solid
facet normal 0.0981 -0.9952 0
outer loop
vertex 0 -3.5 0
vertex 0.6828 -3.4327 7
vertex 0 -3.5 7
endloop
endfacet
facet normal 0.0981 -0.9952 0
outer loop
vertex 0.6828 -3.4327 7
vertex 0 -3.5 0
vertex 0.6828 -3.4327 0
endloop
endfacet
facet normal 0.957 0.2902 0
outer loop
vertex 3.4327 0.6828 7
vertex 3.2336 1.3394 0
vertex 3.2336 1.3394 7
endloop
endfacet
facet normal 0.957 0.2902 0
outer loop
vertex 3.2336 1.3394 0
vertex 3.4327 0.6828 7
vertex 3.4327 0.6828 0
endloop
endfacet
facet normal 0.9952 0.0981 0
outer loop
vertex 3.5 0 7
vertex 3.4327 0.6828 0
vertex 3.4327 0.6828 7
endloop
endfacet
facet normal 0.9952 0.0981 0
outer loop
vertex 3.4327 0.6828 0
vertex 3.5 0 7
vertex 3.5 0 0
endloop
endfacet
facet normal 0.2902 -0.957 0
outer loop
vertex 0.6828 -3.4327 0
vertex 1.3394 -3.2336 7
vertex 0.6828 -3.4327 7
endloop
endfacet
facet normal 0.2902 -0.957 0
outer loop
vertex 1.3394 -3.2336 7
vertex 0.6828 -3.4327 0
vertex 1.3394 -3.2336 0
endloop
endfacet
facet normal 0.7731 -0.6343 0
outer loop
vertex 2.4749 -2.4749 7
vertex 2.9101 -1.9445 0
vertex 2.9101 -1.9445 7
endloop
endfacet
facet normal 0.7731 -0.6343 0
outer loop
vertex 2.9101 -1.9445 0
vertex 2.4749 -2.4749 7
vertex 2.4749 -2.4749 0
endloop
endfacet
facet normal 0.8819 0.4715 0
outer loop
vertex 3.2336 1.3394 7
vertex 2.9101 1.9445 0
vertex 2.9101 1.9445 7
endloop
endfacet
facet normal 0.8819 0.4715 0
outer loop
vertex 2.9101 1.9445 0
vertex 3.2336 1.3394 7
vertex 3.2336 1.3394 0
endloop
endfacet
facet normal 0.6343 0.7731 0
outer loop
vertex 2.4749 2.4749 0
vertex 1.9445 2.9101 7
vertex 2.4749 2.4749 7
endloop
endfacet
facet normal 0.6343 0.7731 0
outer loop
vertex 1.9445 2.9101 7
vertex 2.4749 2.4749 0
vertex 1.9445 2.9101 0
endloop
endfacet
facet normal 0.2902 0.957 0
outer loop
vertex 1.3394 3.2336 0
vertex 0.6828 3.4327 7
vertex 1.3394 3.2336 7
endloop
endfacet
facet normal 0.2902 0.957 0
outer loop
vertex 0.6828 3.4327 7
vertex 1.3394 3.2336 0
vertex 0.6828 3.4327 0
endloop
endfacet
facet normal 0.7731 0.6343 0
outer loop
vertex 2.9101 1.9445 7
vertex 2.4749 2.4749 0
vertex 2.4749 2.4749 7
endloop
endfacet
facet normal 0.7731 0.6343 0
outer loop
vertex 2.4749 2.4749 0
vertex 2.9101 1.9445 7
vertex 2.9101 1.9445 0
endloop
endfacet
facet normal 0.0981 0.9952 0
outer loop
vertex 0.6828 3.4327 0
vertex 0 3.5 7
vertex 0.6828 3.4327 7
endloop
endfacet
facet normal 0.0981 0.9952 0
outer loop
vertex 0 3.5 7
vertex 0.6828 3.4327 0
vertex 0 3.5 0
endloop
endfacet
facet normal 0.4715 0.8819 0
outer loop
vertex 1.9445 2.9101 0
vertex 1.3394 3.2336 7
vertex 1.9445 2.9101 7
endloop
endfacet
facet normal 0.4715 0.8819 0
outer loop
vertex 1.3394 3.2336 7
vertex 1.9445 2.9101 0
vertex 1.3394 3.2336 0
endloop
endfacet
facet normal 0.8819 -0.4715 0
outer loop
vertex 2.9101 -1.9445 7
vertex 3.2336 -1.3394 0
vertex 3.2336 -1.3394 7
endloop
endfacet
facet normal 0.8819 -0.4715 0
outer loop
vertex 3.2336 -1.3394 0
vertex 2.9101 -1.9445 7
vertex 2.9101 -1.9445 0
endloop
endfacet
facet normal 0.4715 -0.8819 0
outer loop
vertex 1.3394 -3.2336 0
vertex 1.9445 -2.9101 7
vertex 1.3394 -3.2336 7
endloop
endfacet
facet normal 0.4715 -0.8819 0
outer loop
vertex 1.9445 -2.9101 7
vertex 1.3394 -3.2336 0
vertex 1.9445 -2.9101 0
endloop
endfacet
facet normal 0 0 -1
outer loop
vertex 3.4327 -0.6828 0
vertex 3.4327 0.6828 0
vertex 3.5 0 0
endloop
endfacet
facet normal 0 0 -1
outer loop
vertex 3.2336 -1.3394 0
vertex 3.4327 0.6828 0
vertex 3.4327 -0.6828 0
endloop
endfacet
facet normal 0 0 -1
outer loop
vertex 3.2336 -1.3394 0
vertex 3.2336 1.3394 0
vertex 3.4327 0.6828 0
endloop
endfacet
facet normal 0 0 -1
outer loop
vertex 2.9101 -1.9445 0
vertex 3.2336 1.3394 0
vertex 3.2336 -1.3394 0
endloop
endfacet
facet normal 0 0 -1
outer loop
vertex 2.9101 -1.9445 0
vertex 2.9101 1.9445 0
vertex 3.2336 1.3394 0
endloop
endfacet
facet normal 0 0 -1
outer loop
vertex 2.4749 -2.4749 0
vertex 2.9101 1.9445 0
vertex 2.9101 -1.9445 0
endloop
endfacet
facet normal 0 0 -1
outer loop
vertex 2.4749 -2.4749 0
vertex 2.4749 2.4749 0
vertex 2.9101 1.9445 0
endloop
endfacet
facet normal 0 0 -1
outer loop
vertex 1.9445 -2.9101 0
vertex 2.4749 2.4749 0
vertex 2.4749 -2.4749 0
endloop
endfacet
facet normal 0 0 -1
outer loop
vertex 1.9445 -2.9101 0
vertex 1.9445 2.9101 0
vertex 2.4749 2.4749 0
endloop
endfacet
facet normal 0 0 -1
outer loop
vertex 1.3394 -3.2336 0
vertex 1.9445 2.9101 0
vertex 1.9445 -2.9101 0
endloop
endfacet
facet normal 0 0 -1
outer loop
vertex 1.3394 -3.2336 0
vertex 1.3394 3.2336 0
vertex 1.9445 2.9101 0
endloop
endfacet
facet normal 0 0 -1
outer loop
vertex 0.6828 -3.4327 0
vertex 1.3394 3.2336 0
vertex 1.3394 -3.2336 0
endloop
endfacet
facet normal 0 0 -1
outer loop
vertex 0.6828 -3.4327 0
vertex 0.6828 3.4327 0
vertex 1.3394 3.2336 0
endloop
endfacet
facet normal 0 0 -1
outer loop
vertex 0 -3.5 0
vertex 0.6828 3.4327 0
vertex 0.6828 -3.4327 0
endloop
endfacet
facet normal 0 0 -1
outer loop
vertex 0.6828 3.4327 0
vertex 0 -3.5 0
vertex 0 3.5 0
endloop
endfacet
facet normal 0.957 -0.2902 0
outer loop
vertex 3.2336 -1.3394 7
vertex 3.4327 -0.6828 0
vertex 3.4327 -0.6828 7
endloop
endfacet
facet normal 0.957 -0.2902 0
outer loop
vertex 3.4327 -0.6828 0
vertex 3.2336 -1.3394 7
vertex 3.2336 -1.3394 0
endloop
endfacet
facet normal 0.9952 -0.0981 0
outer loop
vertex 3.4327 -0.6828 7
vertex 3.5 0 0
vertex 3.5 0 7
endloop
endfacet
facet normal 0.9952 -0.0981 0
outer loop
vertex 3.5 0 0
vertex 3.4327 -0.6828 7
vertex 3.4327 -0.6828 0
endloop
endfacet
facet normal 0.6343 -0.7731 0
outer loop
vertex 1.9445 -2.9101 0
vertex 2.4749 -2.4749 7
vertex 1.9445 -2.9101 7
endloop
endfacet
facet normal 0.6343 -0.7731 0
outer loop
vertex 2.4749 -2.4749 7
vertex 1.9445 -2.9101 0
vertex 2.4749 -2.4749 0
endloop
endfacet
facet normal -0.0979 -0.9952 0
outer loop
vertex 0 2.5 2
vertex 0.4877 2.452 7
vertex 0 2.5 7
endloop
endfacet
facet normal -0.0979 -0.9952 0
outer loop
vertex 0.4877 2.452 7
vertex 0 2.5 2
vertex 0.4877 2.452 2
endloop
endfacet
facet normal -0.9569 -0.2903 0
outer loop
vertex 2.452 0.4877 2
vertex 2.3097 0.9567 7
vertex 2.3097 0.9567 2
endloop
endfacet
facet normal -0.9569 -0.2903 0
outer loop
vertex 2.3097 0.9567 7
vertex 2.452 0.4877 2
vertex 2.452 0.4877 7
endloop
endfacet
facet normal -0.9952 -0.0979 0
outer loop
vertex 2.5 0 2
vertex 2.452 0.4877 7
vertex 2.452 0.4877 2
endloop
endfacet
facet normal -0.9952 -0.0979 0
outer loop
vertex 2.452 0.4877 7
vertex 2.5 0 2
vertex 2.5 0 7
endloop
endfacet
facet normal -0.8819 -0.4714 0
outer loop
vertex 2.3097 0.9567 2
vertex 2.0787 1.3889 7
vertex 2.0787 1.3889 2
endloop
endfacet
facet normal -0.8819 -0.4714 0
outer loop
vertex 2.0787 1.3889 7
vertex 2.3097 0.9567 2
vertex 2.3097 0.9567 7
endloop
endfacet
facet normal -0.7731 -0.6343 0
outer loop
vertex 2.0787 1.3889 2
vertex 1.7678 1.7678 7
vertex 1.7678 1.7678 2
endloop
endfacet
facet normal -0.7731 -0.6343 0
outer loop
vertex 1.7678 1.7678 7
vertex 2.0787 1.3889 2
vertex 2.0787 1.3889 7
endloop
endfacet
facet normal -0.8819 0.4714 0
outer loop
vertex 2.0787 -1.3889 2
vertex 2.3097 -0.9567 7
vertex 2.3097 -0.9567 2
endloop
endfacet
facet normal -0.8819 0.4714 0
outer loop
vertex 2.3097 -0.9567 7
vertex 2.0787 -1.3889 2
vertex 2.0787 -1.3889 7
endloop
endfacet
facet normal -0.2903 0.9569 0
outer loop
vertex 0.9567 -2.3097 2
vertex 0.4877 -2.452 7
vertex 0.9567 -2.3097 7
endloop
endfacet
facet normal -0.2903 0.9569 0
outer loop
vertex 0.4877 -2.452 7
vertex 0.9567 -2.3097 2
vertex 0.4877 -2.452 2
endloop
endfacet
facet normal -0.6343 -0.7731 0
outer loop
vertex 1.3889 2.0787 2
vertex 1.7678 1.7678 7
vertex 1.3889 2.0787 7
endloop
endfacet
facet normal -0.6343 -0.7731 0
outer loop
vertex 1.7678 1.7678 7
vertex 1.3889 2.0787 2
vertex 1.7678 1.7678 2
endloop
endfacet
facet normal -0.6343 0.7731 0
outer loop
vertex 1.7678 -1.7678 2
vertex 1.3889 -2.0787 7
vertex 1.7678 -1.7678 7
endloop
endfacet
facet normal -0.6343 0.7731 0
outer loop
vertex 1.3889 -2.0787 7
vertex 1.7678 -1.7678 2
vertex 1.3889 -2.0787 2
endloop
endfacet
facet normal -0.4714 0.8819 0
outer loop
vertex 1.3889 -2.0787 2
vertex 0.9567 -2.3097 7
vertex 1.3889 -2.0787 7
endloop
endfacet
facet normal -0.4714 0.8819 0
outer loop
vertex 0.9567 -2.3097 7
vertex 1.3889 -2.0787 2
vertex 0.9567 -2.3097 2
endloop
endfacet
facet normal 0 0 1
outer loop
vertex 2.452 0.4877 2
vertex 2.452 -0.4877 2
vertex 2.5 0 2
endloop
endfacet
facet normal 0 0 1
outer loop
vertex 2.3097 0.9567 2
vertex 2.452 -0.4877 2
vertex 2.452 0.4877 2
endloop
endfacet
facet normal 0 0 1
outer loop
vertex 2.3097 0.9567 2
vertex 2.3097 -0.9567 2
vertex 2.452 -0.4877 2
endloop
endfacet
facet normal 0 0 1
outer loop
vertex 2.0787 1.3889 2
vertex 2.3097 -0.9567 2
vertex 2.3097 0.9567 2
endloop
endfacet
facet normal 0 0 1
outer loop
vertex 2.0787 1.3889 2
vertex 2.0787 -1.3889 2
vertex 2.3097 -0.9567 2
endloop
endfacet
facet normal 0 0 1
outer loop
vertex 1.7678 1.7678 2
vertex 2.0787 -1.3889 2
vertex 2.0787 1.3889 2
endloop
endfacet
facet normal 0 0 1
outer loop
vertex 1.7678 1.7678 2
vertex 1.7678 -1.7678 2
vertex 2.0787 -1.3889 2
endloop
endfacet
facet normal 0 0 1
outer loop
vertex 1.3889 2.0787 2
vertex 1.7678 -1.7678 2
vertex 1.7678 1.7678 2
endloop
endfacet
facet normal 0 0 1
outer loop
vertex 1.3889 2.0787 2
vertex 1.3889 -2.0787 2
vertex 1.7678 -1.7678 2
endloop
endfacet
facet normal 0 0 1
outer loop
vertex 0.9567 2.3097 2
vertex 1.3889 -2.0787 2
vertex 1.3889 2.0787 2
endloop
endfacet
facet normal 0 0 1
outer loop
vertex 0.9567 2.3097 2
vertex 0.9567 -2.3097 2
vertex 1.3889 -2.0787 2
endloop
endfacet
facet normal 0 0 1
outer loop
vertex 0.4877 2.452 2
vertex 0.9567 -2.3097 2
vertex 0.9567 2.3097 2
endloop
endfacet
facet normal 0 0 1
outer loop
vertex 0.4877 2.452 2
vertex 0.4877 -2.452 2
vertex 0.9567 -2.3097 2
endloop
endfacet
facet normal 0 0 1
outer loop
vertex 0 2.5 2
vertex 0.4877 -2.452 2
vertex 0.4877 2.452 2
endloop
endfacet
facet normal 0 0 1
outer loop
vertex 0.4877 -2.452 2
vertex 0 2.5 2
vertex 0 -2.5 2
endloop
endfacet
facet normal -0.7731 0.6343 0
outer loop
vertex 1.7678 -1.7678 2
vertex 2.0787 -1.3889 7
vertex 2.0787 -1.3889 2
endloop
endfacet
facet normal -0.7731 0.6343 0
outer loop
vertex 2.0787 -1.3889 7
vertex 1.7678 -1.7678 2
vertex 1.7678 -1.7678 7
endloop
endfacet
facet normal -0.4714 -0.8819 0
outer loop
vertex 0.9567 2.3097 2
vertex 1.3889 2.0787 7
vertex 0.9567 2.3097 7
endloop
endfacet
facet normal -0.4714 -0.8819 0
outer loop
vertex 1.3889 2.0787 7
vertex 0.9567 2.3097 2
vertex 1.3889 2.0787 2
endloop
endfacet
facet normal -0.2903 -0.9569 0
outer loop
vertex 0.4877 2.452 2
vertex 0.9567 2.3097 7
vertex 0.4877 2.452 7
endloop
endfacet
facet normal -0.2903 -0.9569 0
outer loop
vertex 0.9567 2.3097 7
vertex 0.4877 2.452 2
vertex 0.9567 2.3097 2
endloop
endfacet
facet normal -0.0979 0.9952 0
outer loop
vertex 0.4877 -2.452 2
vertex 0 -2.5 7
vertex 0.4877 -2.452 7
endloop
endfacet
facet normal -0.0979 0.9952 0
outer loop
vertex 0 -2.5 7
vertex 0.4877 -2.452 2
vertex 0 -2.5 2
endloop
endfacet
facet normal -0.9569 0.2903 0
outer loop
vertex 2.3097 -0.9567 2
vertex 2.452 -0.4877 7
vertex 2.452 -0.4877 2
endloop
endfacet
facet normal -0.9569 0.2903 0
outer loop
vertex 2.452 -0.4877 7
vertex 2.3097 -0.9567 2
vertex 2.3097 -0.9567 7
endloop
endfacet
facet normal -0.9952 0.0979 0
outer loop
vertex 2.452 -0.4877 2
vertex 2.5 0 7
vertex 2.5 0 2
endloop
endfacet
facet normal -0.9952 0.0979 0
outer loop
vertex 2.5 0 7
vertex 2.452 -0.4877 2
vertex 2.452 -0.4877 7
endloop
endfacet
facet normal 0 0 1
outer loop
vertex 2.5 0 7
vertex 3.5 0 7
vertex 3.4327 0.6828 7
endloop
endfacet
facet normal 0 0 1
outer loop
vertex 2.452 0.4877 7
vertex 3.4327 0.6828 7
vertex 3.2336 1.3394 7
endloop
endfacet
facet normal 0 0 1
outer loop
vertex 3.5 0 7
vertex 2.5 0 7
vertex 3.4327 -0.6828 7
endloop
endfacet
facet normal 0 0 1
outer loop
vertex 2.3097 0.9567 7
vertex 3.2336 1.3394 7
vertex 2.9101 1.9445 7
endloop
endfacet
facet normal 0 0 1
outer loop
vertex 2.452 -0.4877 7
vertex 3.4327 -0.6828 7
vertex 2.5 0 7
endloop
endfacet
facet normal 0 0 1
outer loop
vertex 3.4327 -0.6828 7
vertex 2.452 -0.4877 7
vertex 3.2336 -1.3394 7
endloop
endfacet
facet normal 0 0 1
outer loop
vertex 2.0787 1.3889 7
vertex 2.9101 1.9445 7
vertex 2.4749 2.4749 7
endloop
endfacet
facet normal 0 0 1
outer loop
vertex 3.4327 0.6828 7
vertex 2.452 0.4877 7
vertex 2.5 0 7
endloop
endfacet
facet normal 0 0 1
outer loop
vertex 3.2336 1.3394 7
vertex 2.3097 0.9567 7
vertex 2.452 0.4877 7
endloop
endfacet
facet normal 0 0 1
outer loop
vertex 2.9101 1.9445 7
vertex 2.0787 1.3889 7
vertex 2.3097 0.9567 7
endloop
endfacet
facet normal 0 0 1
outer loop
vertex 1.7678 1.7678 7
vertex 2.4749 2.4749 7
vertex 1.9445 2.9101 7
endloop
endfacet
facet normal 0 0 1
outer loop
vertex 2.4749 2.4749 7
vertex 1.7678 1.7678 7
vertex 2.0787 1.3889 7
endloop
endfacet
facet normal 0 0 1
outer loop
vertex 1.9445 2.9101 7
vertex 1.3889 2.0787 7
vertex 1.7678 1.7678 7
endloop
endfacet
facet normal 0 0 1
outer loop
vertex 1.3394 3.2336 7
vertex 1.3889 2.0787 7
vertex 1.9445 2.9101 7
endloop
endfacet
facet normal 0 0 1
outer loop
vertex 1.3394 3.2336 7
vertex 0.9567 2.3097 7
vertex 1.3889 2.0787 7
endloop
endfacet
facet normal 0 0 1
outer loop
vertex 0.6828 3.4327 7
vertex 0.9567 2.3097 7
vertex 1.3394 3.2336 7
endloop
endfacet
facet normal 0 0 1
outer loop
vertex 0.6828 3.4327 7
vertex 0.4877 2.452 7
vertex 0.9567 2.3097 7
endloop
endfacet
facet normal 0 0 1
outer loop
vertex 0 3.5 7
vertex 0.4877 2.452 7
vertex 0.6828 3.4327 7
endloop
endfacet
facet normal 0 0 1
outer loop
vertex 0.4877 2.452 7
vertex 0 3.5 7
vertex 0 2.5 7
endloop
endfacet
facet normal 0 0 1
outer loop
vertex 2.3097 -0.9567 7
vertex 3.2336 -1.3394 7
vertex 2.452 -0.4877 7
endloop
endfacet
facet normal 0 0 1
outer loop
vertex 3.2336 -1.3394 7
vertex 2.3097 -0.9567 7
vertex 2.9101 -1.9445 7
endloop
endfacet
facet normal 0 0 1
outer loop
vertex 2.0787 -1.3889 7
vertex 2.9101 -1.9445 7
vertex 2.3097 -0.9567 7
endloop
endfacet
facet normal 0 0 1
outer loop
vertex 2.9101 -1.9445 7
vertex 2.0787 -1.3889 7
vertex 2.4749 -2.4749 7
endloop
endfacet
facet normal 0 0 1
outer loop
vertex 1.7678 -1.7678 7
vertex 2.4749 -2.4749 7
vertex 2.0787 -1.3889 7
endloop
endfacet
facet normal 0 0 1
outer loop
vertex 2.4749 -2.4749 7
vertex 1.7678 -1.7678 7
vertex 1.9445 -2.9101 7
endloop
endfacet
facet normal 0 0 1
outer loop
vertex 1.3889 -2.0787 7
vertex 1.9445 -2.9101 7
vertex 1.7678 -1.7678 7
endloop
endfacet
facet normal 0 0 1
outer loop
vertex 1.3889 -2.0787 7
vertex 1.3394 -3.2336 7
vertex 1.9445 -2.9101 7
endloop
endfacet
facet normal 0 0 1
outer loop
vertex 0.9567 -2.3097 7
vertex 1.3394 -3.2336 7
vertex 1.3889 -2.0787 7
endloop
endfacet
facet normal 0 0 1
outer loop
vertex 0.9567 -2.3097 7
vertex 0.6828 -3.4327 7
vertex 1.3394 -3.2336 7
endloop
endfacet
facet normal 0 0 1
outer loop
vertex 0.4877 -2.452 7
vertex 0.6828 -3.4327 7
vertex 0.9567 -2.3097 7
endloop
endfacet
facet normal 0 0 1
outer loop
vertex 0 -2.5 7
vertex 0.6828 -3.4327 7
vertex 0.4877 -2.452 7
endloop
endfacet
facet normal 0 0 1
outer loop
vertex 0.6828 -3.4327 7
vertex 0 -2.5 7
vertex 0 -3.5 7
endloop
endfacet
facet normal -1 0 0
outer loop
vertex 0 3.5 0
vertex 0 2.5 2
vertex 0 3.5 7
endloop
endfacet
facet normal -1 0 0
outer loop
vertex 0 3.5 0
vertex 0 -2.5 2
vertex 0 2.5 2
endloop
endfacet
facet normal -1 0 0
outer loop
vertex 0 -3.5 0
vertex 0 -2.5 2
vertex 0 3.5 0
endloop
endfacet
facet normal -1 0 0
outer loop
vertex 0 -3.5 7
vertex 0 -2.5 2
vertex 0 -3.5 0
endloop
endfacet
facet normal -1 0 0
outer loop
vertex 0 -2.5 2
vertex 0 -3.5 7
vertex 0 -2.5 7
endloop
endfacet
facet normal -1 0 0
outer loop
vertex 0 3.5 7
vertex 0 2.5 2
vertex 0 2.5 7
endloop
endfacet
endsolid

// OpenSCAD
// file: ../build-stamp.scad
// AUTO-GENERATED by scripts/Export-OpenScadStl.ps1 - do not edit by hand
// Source: build-config.json

info_stamp_line1 = "Verminology";
info_stamp_line2 = "Liquid Bait Station";
info_stamp_line3 = "v2.7.0 Prototype";
reservoir_stamp_bottom = false;
station_stamp_bottom = true;
needle_seal_stamp_bottom = false;
stopper_stamp_bottom = false;
grip_stamp_bottom = false;
anvil_stamp_bottom = false;
// main file
// Flow Stopper for V2 Liquid Bait Station
// Spring-loaded piston that blocks flow through the needle seal when
// the reservoir is removed from the station.  The station needle pushes
// the stopper back against the spring to open the flow path.
//
// Orientation: z = 0 at bottom face.

include <common.scad>

module stopper() {
    difference() {
        cylinder(h = stopper_h, d = stopper_od);
        translate([0, 0, stopper_h - stopper_bore_depth])
            cylinder(h = stopper_bore_depth + 0.01, d = stopper_bore_id);
    }
}

// ── Render ────────────────────────────────────────────────────────
crosssection(stopper_od) stopper();
